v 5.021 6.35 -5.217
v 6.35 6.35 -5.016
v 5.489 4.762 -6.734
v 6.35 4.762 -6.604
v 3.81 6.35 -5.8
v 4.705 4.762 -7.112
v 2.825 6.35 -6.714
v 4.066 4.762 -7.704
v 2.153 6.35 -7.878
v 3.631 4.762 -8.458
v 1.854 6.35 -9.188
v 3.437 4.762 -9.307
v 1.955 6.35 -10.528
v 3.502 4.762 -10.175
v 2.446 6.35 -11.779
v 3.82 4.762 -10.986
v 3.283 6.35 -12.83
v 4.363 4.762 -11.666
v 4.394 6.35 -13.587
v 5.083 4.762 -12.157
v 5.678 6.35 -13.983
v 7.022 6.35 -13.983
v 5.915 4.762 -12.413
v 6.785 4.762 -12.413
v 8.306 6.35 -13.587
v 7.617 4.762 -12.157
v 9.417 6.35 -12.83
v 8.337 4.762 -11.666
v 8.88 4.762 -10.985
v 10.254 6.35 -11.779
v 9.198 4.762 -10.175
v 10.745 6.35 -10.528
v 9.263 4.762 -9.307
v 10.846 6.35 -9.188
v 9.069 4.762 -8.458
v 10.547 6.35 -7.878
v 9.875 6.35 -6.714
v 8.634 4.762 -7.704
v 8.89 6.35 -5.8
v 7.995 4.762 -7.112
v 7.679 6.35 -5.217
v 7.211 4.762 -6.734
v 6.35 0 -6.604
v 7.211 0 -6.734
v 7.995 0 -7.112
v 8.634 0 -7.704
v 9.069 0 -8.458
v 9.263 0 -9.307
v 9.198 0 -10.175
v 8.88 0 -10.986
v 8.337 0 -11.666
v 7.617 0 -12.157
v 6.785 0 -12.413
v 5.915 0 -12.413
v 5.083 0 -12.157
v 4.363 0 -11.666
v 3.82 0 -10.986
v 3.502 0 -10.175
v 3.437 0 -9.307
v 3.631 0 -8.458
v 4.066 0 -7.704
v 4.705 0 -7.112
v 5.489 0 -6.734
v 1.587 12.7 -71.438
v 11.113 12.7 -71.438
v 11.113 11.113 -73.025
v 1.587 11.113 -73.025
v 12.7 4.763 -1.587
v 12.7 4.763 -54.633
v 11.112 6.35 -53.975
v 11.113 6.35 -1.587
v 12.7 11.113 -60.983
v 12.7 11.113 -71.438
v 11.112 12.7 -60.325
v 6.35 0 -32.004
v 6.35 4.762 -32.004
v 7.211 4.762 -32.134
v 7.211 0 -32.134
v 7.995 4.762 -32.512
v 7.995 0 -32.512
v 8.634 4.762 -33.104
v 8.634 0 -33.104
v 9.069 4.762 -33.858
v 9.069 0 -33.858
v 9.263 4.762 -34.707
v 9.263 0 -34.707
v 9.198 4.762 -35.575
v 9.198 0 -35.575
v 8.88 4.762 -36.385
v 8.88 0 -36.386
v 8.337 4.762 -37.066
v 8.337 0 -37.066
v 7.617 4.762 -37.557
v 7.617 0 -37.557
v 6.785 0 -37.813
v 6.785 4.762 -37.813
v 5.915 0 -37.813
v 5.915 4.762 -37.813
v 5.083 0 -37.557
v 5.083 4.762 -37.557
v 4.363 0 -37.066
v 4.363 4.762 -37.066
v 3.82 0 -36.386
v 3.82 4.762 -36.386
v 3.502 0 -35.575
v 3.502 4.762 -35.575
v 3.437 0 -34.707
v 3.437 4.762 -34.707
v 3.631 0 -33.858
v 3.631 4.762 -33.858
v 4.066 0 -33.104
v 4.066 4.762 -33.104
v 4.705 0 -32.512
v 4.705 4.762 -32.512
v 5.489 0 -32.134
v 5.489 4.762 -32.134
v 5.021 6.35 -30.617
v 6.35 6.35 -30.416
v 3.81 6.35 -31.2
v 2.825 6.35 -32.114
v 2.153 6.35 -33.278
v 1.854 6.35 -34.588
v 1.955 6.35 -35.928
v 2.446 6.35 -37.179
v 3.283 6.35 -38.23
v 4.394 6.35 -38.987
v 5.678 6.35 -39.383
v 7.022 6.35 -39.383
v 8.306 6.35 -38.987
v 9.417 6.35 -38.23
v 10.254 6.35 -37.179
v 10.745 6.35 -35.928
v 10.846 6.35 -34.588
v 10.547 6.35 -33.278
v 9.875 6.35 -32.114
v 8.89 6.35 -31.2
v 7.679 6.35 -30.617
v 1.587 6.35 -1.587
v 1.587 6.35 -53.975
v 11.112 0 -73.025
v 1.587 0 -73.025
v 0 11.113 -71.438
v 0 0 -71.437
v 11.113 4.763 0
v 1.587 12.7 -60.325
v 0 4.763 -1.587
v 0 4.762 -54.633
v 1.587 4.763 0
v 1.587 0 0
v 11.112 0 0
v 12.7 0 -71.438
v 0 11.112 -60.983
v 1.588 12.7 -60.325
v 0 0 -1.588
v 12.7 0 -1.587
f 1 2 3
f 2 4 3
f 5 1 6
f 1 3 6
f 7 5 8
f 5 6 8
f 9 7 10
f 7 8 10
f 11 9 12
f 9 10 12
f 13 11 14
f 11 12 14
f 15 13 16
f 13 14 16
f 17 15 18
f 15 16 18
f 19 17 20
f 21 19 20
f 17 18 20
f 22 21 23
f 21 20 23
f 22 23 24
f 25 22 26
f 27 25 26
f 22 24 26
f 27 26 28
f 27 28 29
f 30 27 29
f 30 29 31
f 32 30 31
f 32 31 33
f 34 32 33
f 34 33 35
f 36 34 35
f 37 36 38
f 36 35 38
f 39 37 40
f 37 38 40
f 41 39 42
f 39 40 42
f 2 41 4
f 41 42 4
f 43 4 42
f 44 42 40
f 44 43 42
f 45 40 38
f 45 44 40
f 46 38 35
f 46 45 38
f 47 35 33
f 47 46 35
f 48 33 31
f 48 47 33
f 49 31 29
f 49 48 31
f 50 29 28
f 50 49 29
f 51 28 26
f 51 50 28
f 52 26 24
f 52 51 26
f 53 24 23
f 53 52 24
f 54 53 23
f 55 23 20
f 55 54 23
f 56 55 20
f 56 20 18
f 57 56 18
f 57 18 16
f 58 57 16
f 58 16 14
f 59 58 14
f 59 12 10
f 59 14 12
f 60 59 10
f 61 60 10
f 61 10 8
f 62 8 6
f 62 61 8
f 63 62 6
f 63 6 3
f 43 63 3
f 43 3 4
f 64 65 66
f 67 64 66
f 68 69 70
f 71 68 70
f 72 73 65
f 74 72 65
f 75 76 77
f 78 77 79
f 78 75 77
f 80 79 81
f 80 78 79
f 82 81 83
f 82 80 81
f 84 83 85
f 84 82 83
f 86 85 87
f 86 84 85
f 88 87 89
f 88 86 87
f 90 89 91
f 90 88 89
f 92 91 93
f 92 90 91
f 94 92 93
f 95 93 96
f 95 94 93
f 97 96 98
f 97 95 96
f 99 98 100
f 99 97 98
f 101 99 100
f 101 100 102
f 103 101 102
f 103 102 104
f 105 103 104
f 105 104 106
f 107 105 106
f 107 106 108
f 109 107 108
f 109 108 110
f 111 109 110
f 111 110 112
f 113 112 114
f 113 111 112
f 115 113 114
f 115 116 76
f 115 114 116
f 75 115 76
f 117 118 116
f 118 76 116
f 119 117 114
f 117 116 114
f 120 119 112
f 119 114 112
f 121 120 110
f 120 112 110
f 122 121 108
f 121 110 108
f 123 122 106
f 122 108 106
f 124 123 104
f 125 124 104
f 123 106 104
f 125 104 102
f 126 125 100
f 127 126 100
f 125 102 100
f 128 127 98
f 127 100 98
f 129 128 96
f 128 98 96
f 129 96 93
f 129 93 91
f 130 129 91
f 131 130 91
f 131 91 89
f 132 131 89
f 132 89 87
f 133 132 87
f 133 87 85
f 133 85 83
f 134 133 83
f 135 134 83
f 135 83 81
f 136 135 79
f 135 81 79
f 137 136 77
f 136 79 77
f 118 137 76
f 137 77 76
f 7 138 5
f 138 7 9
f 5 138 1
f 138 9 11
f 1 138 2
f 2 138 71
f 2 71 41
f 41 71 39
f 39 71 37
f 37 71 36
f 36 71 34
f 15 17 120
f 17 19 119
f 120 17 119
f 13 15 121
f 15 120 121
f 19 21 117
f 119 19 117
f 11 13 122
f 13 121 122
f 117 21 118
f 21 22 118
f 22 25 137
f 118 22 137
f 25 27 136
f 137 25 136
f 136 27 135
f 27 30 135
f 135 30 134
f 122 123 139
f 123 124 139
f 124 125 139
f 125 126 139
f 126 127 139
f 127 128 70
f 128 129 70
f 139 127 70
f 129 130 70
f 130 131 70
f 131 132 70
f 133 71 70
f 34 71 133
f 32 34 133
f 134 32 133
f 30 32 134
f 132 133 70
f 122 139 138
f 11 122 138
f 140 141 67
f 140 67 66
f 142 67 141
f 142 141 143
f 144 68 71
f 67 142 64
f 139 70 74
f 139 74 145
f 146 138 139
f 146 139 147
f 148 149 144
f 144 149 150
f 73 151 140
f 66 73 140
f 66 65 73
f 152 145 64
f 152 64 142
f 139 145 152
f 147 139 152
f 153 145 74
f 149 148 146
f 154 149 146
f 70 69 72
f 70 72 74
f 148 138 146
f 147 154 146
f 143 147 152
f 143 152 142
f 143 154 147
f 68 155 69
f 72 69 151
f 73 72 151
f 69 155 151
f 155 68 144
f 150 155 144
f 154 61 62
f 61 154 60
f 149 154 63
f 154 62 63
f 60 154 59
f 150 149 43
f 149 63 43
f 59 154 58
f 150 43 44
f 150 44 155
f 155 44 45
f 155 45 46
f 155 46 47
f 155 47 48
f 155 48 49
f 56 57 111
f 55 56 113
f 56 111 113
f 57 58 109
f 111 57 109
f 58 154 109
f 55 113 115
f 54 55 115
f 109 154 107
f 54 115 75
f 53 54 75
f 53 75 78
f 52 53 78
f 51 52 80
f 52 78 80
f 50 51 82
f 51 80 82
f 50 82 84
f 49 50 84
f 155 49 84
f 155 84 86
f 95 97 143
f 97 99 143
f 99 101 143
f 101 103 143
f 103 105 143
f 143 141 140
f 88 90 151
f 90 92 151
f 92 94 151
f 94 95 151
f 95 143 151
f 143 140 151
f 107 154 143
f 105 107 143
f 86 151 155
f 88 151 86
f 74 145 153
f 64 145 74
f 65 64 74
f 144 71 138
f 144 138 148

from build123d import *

# Parameters (mm, degrees)
SKETCH1_W           = 12.7
SKETCH1_H           = 73.025
SKETCH1_R           = 2.921
BOSS_EXTRUDE1_DEPTH = 12.7
SKETCH2_W           = 60.325
SKETCH2_H           = 6.35
CUT_EXTRUDE1_DEPTH  = 76.201267443
CHAMFER1_SIZE       = 6.35


# Some blends are built 0.0001 mm under size
with BuildPart() as part:
    # Sketch1 → Boss-Extrude1 (new body)
    with BuildSketch(Plane(origin=(0, 0, 0), x_dir=(1, 0, 0), z_dir=(0, 1, 0))):
        with Locations((6.35, 36.5125)):
            Rectangle(SKETCH1_W, SKETCH1_H)
        with Locations(Location((6.35, 9.525, 0), (0, 0, 270))):
            Circle(SKETCH1_R, mode=Mode.SUBTRACT)
        with Locations(Location((6.35, 34.925, 0), (0, 0, 270))):
            Circle(SKETCH1_R, mode=Mode.SUBTRACT)
    extrude(amount=BOSS_EXTRUDE1_DEPTH)

    # Sketch2 → Cut-Extrude1 (cut, through all)
    with BuildSketch(Plane(origin=(12.7, 0, 0), x_dir=(0, 0, -1), z_dir=(1, 0, 0))):
        with Locations((30.1625, 9.525)):
            Rectangle(SKETCH2_W, SKETCH2_H)
    extrude(amount=-CUT_EXTRUDE1_DEPTH, mode=Mode.SUBTRACT)

    # Chamfer1
    chamfer1_edges = [part.edges().sort_by_distance(p)[0] for p in [
        (6.35, 6.35, -60.325),
    ]]
    chamfer(chamfer1_edges, length=CHAMFER1_SIZE - 0.0001)  # a hair under: the kernel refuses the full size

    # Chamfer2
    # the kernel refuses this chamfer: 1.5875 mm, written as the material it takes off along each edge
    with BuildSketch(Plane(origin=(11.641666667, 11.641666667, -71.966666667), x_dir=(-0.7071067811865476, 0.7071067811865476, 0), z_dir=(0.5773502691896264, 0.5773502691896264, -0.5773502691896245)), Plane(origin=(1.058333333, 5.291666667, -1.058333333), x_dir=(0.7071067811865476, 0.7071067811865476, 3.1649107828586326e-15), z_dir=(-0.5773502691896274, 0.5773502691896248, 0.5773502691896252))) as chamfer2_piece_1:
        Polygon((-1.122532015, 0.648094161), (1.122532015, 0.648094161), (0, -1.296188322), align=None)
    extrude(amount=2.016395815, mode=Mode.SUBTRACT)
    with BuildSketch(Plane(origin=(1.058333333, 11.641666667, -71.966666667), x_dir=(0.7071067811865476, 0.7071067811865476, 0), z_dir=(-0.5773502691896264, 0.5773502691896264, -0.5773502691896245)), Plane(origin=(11.641666667, 5.291666667, -1.058333333), x_dir=(-0.7071067811865476, 0.7071067811865476, 0), z_dir=(0.577350269189626, 0.5773502691896254, 0.5773502691896262))) as chamfer2_piece_2:
        Polygon((-1.122532015, -0.648094161), (1.122532015, -0.648094161), (0, 1.296188322), align=None)
    extrude(amount=2.016395815, mode=Mode.SUBTRACT)
    with BuildSketch(Plane(origin=(16.782546743, 12.7, -73.025), x_dir=(0, 0.027495876610586667, 0.9996219169112968), z_dir=(-1, 0, 0)), Plane(origin=(0, 12.7, -77.107546743), x_dir=(0.9996219169112968, 0.02749587661058674, 0), z_dir=(0, 0, 1)), Plane(origin=(0, -4.082546743, -73.025), x_dir=(0.9996219169112968, 0, -0.02749587661058565), z_dir=(0, 1, 0)), Plane(origin=(12.7, -4.082546743, -73.025), x_dir=(0.027495876610586667, 0, 0.9996219169112968), z_dir=(0, 1, 0))) as chamfer2_piece_3:
        with BuildLine():
            Line((1.633018697, 0), (-0.089768608, -1.630549497))
            Line((-0.089768608, -1.630549497), (-0.121506604, -1.629676503))
            ThreePointArc((-0.121506604, -1.629676503), (-0.054180148, -0.815019055), (-0.031737996, 0.000872994))
            Line((-0.031737996, 0.000872994), (0.000872994, 0.031737996))
            ThreePointArc((0.000872994, 0.031737996), (0.816765043, 0.009295844), (1.633891691, 0.031737996))
            Line((1.633891691, 0.031737996), (1.633018697, 0))
        make_face()
    extrude(amount=20.865093487, mode=Mode.SUBTRACT)
    with BuildSketch(Plane(origin=(12.7, 12.7, -56.242453257), x_dir=(0.027495876610586726, -0.9996219169112968, 0), z_dir=(0, 0, -1)), Plane(origin=(16.782546743, 6.35, 0), x_dir=(0, 0.027495876610586223, -0.9996219169112968), z_dir=(-1, 0, 0))) as chamfer2_piece_4:
        with BuildLine():
            Line((1.633018697, 0), (-0.089768608, 1.630549497))
            Line((-0.089768608, 1.630549497), (-0.121506604, 1.629676503))
            ThreePointArc((-0.121506604, 1.629676503), (-0.054180148, 0.815019055), (-0.031737996, -0.000872994))
            Line((-0.031737996, -0.000872994), (0.000872994, -0.031737996))
            ThreePointArc((0.000872994, -0.031737996), (0.816765043, -0.009295844), (1.633891691, -0.031737996))
            Line((1.633891691, -0.031737996), (1.633018697, 0))
        make_face()
    extrude(amount=20.865093487, mode=Mode.SUBTRACT)
    with BuildSketch(Plane(origin=(12.7, -4.082546743, 0), x_dir=(0.027495876610586743, 0, -0.9996219169112966), z_dir=(0, 1, 0)), Plane(origin=(0, -4.082546743, 0), x_dir=(0.9996219169112966, 0, 0.027495876610586424), z_dir=(0, 1, 0))) as chamfer2_piece_5:
        with BuildLine():
            Line((1.633018697, 0), (-0.089768608, 1.630549497))
            Line((-0.089768608, 1.630549497), (-0.121506604, 1.629676503))
            ThreePointArc((-0.121506604, 1.629676503), (-0.054180148, 0.815019055), (-0.031737996, -0.000872994))
            Line((-0.031737996, -0.000872994), (0.000872994, -0.031737996))
            ThreePointArc((0.000872994, -0.031737996), (0.816765043, -0.009295844), (1.633891691, -0.031737996))
            Line((1.633891691, -0.031737996), (1.633018697, 0))
        make_face()
    extrude(amount=14.515093487, mode=Mode.SUBTRACT)
    with BuildSketch(Plane(origin=(6.35, 6.35, -9.525), x_dir=(0, 0, 1), z_dir=(1, 0, 0))) as chamfer2_piece_6:
        with BuildLine():
            Line((4.553401281, -0.044901281), (2.876098719, 1.632401281))
            Line((2.876098719, 1.632401281), (2.844348719, 1.632401281))
            ThreePointArc((2.844348719, 1.632401281), (2.88925, 0.81620064), (2.88925, 0))
            Line((2.88925, 0), (2.921, -0.03175))
            ThreePointArc((2.921, -0.03175), (3.73720064, -0.03175), (4.553401281, -0.076651281))
            Line((4.553401281, -0.076651281), (4.553401281, -0.044901281))
        make_face()
    revolve(axis=Axis((6.35, 6.35, -9.525), (0, -1, 0)), mode=Mode.SUBTRACT)
    with BuildSketch(Plane(origin=(6.35, 6.35, -34.925), x_dir=(0, 0, 1), z_dir=(1, 0, 0))) as chamfer2_piece_7:
        with BuildLine():
            Line((4.553401281, -0.044901281), (2.876098719, 1.632401281))
            Line((2.876098719, 1.632401281), (2.844348719, 1.632401281))
            ThreePointArc((2.844348719, 1.632401281), (2.88925, 0.81620064), (2.88925, 0))
            Line((2.88925, 0), (2.921, -0.03175))
            ThreePointArc((2.921, -0.03175), (3.73720064, -0.03175), (4.553401281, -0.076651281))
            Line((4.553401281, -0.076651281), (4.553401281, -0.044901281))
        make_face()
    revolve(axis=Axis((6.35, 6.35, -34.925), (0, -1, 0)), mode=Mode.SUBTRACT)
    with BuildSketch(Plane(origin=(0, 6.35, -58.057646743), x_dir=(0.9996219169112968, 0.027495876610586195, 0), z_dir=(0, 0, 1))) as chamfer2_piece_8_section:
        with BuildLine():
            Line((1.633018697, 0), (-0.089768608, -1.630549497))
            Line((-0.089768608, -1.630549497), (-0.121506604, -1.629676503))
            ThreePointArc((-0.121506604, -1.629676503), (-0.054180148, -0.815019055), (-0.031737996, 0.000872994))
            Line((-0.031737996, 0.000872994), (0.000872994, 0.031737996))
            ThreePointArc((0.000872994, 0.031737996), (0.816765043, 0.009295844), (1.633891691, 0.031737996))
            Line((1.633891691, 0.031737996), (1.633018697, 0))
        make_face()
    chamfer2_piece_8 = extrude(amount=62.140193487, mode=Mode.PRIVATE)
    chamfer2_piece_8 = split(chamfer2_piece_8, bisect_by=Plane(origin=(0.525034433, -8.55498603, -39.07011397), z_dir=(0, 0.7071067811865474, 0.7071067811865477)), keep=Keep.TOP, mode=Mode.PRIVATE)
    add(chamfer2_piece_8, mode=Mode.SUBTRACT)
    with BuildSketch(Plane(origin=(12.7, 6.35, -58.057646743), x_dir=(0.02749587661058674, -0.9996219169112966, 0), z_dir=(0, 0, 1))) as chamfer2_piece_9_section:
        with BuildLine():
            Line((1.633018697, 0), (-0.089768608, -1.630549497))
            Line((-0.089768608, -1.630549497), (-0.121506604, -1.629676503))
            ThreePointArc((-0.121506604, -1.629676503), (-0.054180148, -0.815019055), (-0.031737996, 0.000872994))
            Line((-0.031737996, 0.000872994), (0.000872994, 0.031737996))
            ThreePointArc((0.000872994, 0.031737996), (0.816765043, 0.009295844), (1.633891691, 0.031737996))
            Line((1.633891691, 0.031737996), (1.633018697, 0))
        make_face()
    chamfer2_piece_9 = extrude(amount=62.140193487, mode=Mode.PRIVATE)
    chamfer2_piece_9 = split(chamfer2_piece_9, bisect_by=Plane(origin=(12.174965567, -8.55498603, -39.07011397), z_dir=(0, 0.7071067811865474, 0.7071067811865477)), keep=Keep.TOP, mode=Mode.PRIVATE)
    add(chamfer2_piece_9, mode=Mode.SUBTRACT)
    with BuildSketch(Plane(origin=(12.7, 3.463203513, -51.088303513), x_dir=(0.02749587661058673, -0.7068394360706733, -0.7068394360706736), z_dir=(0, 0.7071067811865477, -0.7071067811865474))) as chamfer2_piece_10_section:
        with BuildLine():
            Line((1.633018697, 0), (-0.089768608, 1.630549497))
            Line((-0.089768608, 1.630549497), (-0.121506604, 1.629676503))
            ThreePointArc((-0.121506604, 1.629676503), (-0.054180148, 0.815019055), (-0.031737996, -0.000872994))
            Line((-0.031737996, -0.000872994), (0.000872994, -0.031737996))
            ThreePointArc((0.000872994, -0.031737996), (0.816765043, -0.009295844), (1.633891691, -0.031737996))
            Line((1.633891691, -0.031737996), (1.633018697, 0))
        make_face()
    chamfer2_piece_10 = extrude(amount=17.145208187, mode=Mode.PRIVATE)
    chamfer2_piece_10 = split(chamfer2_piece_10, bisect_by=Plane(origin=(12.154882998, 6.35, -57.491724347), z_dir=(0, 1, 0)), keep=Keep.TOP, mode=Mode.PRIVATE)
    add(chamfer2_piece_10, mode=Mode.SUBTRACT)
    with BuildSketch(Plane(origin=(0, 3.463203513, -51.088303513), x_dir=(0.9996219169112968, 0.019442520806015003, 0.019442520806015013), z_dir=(0, 0.7071067811865477, -0.7071067811865474))) as chamfer2_piece_11_section:
        with BuildLine():
            Line((1.633018697, 0), (-0.089768608, 1.630549497))
            Line((-0.089768608, 1.630549497), (-0.121506604, 1.629676503))
            ThreePointArc((-0.121506604, 1.629676503), (-0.054180148, 0.815019055), (-0.031737996, -0.000872994))
            Line((-0.031737996, -0.000872994), (0.000872994, -0.031737996))
            ThreePointArc((0.000872994, -0.031737996), (0.816765043, -0.009295844), (1.633891691, -0.031737996))
            Line((1.633891691, -0.031737996), (1.633018697, 0))
        make_face()
    chamfer2_piece_11 = extrude(amount=17.145208187, mode=Mode.PRIVATE)
    chamfer2_piece_11 = split(chamfer2_piece_11, bisect_by=Plane(origin=(0.545117002, 6.35, -57.491724347), z_dir=(0, 1, 0)), keep=Keep.TOP, mode=Mode.PRIVATE)
    add(chamfer2_piece_11, mode=Mode.SUBTRACT)
    with BuildSketch(Plane(origin=(0, 3.463203513, -51.088303513), x_dir=(0.9996219169112968, 0.019442520806015003, 0.019442520806015013), z_dir=(0, 0.7071067811865477, -0.7071067811865474))) as chamfer2_piece_12a_section:
        with BuildLine():
            Line((1.633018697, 0), (-0.089768608, 1.630549497))
            Line((-0.089768608, 1.630549497), (-0.121506604, 1.629676503))
            ThreePointArc((-0.121506604, 1.629676503), (-0.054180148, 0.815019055), (-0.031737996, -0.000872994))
            Line((-0.031737996, -0.000872994), (0.000872994, -0.031737996))
            ThreePointArc((0.000872994, -0.031737996), (0.816765043, -0.009295844), (1.633891691, -0.031737996))
            Line((1.633891691, -0.031737996), (1.633018697, 0))
        make_face()
    chamfer2_piece_12a = extrude(amount=17.145208187, mode=Mode.PRIVATE)
    chamfer2_piece_12a = split(chamfer2_piece_12a, bisect_by=Plane(origin=(0.504972836, 6.35, -53.123859696), z_dir=(0, -1, 0)), keep=Keep.TOP, mode=Mode.PRIVATE)
    with BuildSketch(Plane(origin=(0, 6.35, -58.057646743), x_dir=(0.9996219169112968, 0.027495876610586195, 0), z_dir=(0, 0, 1))) as chamfer2_piece_12b_section:
        with BuildLine():
            Line((1.633018697, 0), (-0.089768608, -1.630549497))
            Line((-0.089768608, -1.630549497), (-0.121506604, -1.629676503))
            ThreePointArc((-0.121506604, -1.629676503), (-0.054180148, -0.815019055), (-0.031737996, 0.000872994))
            Line((-0.031737996, 0.000872994), (0.000872994, 0.031737996))
            ThreePointArc((0.000872994, 0.031737996), (0.816765043, 0.009295844), (1.633891691, 0.031737996))
            Line((1.633891691, 0.031737996), (1.633018697, 0))
        make_face()
    chamfer2_piece_12b = extrude(amount=62.140193487, mode=Mode.PRIVATE)
    chamfer2_piece_12b = split(chamfer2_piece_12b, bisect_by=Plane(origin=(0.504972836, 6.951917791, -54.577017791), z_dir=(0, -0.7071067811865474, -0.7071067811865477)), keep=Keep.TOP, mode=Mode.PRIVATE)
    chamfer2_piece_12 = chamfer2_piece_12a & chamfer2_piece_12b
    add(chamfer2_piece_12, mode=Mode.SUBTRACT)
    with BuildSketch(Plane(origin=(12.7, 3.463203513, -51.088303513), x_dir=(0.02749587661058673, -0.7068394360706733, -0.7068394360706736), z_dir=(0, 0.7071067811865477, -0.7071067811865474))) as chamfer2_piece_13a_section:
        with BuildLine():
            Line((1.633018697, 0), (-0.089768608, 1.630549497))
            Line((-0.089768608, 1.630549497), (-0.121506604, 1.629676503))
            ThreePointArc((-0.121506604, 1.629676503), (-0.054180148, 0.815019055), (-0.031737996, -0.000872994))
            Line((-0.031737996, -0.000872994), (0.000872994, -0.031737996))
            ThreePointArc((0.000872994, -0.031737996), (0.816765043, -0.009295844), (1.633891691, -0.031737996))
            Line((1.633891691, -0.031737996), (1.633018697, 0))
        make_face()
    chamfer2_piece_13a = extrude(amount=17.145208187, mode=Mode.PRIVATE)
    chamfer2_piece_13a = split(chamfer2_piece_13a, bisect_by=Plane(origin=(12.195027164, 6.35, -53.123859696), z_dir=(0, -1, 0)), keep=Keep.TOP, mode=Mode.PRIVATE)
    with BuildSketch(Plane(origin=(12.7, 6.35, -58.057646743), x_dir=(0.02749587661058674, -0.9996219169112966, 0), z_dir=(0, 0, 1))) as chamfer2_piece_13b_section:
        with BuildLine():
            Line((1.633018697, 0), (-0.089768608, -1.630549497))
            Line((-0.089768608, -1.630549497), (-0.121506604, -1.629676503))
            ThreePointArc((-0.121506604, -1.629676503), (-0.054180148, -0.815019055), (-0.031737996, 0.000872994))
            Line((-0.031737996, 0.000872994), (0.000872994, 0.031737996))
            ThreePointArc((0.000872994, 0.031737996), (0.816765043, 0.009295844), (1.633891691, 0.031737996))
            Line((1.633891691, 0.031737996), (1.633018697, 0))
        make_face()
    chamfer2_piece_13b = extrude(amount=62.140193487, mode=Mode.PRIVATE)
    chamfer2_piece_13b = split(chamfer2_piece_13b, bisect_by=Plane(origin=(12.195027164, 6.951917791, -54.577017791), z_dir=(0, -0.7071067811865474, -0.7071067811865477)), keep=Keep.TOP, mode=Mode.PRIVATE)
    chamfer2_piece_13 = chamfer2_piece_13a & chamfer2_piece_13b
    add(chamfer2_piece_13, mode=Mode.SUBTRACT)


solid = part.part
